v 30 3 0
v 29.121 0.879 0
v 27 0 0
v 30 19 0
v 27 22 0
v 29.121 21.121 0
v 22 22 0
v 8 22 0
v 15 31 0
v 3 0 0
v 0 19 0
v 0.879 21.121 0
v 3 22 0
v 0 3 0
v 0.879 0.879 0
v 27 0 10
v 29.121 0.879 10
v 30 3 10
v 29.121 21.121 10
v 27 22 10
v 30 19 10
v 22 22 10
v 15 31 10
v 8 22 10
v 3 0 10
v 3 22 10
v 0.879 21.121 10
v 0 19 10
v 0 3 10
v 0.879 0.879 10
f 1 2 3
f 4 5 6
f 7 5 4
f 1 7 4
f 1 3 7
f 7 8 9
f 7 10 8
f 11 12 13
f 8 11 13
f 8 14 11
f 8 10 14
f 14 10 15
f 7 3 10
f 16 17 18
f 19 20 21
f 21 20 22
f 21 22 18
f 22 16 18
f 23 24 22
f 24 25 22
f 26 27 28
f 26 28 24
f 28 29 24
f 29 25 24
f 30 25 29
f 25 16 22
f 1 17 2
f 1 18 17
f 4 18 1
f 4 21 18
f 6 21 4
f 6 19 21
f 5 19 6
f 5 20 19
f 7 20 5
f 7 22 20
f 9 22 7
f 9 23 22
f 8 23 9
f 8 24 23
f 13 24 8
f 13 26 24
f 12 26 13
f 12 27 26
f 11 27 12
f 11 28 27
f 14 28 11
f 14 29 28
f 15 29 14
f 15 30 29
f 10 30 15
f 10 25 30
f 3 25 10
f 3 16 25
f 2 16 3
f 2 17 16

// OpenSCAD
$fn = 32;

// ----------------------------------------------------------------------
// Ratchet pawl: 30 x 22 mm body, beak 9 mm сверху
// ----------------------------------------------------------------------

// --- parameters (mm) ---
profile_height = 10;      // extrusion height
profile_points = 15;      // points of the closed outline

profile = [[0, 3], [0.879, 0.879], [3, 0], [27, 0], [29.121, 0.879], [30, 3], [30, 19], [29.121, 21.121], [27, 22], [22, 22], [15, 31], [8, 22], [3, 22], [0.879, 21.121], [0, 19]];  // single closed polygon, 15 points, counter clockwise

// --- the one profile operation ---
linear_extrude(height = profile_height) polygon(points = profile);
